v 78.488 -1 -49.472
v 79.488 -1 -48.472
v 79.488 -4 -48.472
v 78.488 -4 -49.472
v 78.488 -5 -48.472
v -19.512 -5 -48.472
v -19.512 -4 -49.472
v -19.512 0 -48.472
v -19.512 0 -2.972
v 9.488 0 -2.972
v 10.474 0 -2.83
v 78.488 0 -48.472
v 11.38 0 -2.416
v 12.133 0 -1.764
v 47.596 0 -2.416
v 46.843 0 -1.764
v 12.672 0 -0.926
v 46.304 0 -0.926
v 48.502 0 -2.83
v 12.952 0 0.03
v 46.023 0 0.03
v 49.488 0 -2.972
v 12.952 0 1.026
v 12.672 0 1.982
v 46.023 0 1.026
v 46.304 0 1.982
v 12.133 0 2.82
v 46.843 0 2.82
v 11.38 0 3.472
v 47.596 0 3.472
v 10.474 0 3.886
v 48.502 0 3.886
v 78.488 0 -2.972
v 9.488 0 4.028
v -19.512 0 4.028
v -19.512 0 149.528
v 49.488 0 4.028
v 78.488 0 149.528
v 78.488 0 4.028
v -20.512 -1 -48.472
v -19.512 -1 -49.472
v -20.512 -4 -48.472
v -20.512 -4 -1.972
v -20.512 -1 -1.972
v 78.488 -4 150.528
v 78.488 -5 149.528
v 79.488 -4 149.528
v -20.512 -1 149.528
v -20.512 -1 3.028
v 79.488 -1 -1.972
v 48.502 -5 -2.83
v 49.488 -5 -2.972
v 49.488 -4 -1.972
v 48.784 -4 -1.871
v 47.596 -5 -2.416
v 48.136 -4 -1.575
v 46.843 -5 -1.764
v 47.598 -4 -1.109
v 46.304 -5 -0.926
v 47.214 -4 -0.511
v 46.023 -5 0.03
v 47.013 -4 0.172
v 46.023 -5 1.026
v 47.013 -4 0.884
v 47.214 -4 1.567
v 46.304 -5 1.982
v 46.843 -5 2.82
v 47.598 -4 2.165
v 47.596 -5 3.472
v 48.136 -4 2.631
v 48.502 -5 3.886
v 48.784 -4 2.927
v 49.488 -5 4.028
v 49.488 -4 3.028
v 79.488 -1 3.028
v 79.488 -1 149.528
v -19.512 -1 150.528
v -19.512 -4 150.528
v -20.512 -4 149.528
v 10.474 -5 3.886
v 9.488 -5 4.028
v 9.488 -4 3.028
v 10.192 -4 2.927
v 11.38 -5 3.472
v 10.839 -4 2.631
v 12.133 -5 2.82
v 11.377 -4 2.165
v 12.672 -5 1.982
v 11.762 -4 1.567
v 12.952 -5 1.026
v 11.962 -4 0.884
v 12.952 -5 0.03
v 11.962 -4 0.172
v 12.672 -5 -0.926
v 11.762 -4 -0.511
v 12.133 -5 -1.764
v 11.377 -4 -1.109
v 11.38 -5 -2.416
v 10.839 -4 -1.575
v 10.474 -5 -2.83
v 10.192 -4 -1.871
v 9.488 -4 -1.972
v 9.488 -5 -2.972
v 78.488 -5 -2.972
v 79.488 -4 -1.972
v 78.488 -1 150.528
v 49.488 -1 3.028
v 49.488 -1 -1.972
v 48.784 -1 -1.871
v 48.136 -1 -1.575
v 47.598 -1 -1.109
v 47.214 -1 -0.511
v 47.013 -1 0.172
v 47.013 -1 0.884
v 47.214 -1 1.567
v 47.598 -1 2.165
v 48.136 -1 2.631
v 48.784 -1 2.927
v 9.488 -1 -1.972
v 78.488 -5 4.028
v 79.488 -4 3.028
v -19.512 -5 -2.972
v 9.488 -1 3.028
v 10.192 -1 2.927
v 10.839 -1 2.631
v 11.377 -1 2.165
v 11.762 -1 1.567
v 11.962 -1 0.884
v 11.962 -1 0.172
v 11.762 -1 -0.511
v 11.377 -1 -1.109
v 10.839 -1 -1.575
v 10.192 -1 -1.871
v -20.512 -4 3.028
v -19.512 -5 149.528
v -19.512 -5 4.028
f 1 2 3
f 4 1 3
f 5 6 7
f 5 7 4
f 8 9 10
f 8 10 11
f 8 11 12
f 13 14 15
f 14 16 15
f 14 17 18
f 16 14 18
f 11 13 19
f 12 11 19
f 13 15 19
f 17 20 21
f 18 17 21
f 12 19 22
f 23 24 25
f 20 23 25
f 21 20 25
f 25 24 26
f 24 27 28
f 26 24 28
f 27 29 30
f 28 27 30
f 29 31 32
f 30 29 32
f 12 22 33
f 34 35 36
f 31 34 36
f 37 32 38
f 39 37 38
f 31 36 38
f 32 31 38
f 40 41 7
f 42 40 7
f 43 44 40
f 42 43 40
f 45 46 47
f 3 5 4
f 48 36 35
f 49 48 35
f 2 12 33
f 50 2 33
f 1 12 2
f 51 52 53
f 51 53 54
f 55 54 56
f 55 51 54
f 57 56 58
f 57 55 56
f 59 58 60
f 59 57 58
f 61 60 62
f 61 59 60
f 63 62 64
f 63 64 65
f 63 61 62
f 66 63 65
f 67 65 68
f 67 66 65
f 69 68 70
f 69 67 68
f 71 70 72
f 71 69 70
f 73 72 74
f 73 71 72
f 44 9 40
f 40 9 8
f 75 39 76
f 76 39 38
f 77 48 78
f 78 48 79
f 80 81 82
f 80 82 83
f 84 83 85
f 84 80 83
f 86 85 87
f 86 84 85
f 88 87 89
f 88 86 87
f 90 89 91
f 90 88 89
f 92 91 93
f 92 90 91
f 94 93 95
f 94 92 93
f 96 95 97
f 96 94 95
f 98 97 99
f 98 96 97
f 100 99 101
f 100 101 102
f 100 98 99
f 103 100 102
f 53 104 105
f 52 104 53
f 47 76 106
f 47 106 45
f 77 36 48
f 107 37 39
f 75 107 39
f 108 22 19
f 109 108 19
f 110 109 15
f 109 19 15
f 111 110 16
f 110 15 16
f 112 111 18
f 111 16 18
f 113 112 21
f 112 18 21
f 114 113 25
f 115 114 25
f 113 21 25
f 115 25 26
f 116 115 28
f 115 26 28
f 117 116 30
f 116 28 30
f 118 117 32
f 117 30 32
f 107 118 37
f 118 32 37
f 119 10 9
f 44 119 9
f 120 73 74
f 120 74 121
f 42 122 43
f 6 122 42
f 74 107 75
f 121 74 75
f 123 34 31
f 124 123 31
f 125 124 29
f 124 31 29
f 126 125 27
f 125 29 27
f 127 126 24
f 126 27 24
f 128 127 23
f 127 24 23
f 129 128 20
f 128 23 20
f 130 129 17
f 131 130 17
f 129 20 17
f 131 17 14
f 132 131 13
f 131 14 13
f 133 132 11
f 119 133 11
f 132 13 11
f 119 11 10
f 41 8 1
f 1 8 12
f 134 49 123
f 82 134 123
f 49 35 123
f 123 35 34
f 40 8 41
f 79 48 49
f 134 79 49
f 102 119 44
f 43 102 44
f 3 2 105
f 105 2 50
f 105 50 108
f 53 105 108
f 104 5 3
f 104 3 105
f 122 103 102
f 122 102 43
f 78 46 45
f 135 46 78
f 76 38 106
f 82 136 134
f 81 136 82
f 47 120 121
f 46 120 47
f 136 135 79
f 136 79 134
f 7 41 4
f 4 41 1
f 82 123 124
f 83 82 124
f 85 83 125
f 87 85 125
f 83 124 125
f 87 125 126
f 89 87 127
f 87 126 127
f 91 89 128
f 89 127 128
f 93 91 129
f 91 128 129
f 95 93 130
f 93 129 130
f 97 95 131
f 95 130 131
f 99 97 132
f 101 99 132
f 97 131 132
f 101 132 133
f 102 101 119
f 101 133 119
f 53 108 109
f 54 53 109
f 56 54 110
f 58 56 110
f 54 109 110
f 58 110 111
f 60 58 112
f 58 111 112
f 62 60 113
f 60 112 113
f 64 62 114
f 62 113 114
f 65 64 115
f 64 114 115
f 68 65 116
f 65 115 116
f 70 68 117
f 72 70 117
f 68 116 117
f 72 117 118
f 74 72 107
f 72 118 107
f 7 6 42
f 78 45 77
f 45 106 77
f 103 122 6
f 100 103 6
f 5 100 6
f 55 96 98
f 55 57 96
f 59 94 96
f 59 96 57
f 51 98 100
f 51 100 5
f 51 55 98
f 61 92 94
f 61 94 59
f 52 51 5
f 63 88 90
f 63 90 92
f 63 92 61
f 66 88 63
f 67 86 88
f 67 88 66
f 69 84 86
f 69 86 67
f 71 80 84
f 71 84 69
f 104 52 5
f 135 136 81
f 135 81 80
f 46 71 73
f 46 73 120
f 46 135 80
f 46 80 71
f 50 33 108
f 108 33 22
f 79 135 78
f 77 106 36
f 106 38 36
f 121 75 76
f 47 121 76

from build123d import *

# Parameters (mm, degrees)
F1_DEPTH = 5
F2_SIZE  = 1


with BuildPart() as f1:
    # F0 (on Front) → F1 (new body)
    with BuildSketch(Plane.XZ):
        with BuildLine():
            Line((79.487856, 150.528029), (-20.512144, 150.528029))
            Line((-20.512144, 150.528029), (-20.512144, 3.028029))
            Line((-20.512144, 3.028029), (9.487856, 3.028029))
            ThreePointArc((9.487856, 3.028029), (11.987856, 0.528029), (9.487856, -1.971971))
            Line((9.487856, -1.971971), (-20.512144, -1.971971))
            Line((-20.512144, -1.971971), (-20.512144, -49.471971))
            Line((-20.512144, -49.471971), (79.487856, -49.471971))
            Line((79.487856, -49.471971), (79.487856, -1.971971))
            Line((79.487856, -1.971971), (49.487856, -1.971971))
            ThreePointArc((49.487856, -1.971971), (46.987856, 0.528029), (49.487856, 3.028029))
            Line((49.487856, 3.028029), (79.487856, 3.028029))
            Line((79.487856, 3.028029), (79.487856, 150.528029))
        make_face()
    extrude(amount=F1_DEPTH)

    # F2
    f2_edges = [f1.edges().sort_by_distance(p)[0] for p in [
        (29.487856, -5, 150.528029),
        (-20.512144, -5, 76.778029),
        (-5.512144, -5, 3.028029),
        (11.987856, -5, 0.528029),
        (-5.512144, -5, -1.971971),
        (-20.512144, -5, -25.721971),
        (29.487856, -5, -49.471971),
        (79.487856, -5, -25.721971),
        (64.487856, -5, -1.971971),
        (46.987856, -5, 0.528029),
        (64.487856, -5, 3.028029),
        (79.487856, -5, 76.778029),
        (29.487856, 0, 150.528029),
        (-20.512144, 0, 76.778029),
        (-5.512144, 0, 3.028029),
        (11.987856, 0, 0.528029),
        (-5.512144, 0, -1.971971),
        (-20.512144, 0, -25.721971),
        (29.487856, 0, -49.471971),
        (79.487856, 0, -25.721971),
        (64.487856, 0, -1.971971),
        (46.987856, 0, 0.528029),
        (64.487856, 0, 3.028029),
        (79.487856, 0, 76.778029),
        (-20.512144, -2.5, -49.471971),
        (79.487856, -2.5, -49.471971),
        (79.487856, -2.5, 150.528029),
        (-20.512144, -2.5, 150.528029),
    ]]
    chamfer(f2_edges, length=F2_SIZE)


solid = f1.part
